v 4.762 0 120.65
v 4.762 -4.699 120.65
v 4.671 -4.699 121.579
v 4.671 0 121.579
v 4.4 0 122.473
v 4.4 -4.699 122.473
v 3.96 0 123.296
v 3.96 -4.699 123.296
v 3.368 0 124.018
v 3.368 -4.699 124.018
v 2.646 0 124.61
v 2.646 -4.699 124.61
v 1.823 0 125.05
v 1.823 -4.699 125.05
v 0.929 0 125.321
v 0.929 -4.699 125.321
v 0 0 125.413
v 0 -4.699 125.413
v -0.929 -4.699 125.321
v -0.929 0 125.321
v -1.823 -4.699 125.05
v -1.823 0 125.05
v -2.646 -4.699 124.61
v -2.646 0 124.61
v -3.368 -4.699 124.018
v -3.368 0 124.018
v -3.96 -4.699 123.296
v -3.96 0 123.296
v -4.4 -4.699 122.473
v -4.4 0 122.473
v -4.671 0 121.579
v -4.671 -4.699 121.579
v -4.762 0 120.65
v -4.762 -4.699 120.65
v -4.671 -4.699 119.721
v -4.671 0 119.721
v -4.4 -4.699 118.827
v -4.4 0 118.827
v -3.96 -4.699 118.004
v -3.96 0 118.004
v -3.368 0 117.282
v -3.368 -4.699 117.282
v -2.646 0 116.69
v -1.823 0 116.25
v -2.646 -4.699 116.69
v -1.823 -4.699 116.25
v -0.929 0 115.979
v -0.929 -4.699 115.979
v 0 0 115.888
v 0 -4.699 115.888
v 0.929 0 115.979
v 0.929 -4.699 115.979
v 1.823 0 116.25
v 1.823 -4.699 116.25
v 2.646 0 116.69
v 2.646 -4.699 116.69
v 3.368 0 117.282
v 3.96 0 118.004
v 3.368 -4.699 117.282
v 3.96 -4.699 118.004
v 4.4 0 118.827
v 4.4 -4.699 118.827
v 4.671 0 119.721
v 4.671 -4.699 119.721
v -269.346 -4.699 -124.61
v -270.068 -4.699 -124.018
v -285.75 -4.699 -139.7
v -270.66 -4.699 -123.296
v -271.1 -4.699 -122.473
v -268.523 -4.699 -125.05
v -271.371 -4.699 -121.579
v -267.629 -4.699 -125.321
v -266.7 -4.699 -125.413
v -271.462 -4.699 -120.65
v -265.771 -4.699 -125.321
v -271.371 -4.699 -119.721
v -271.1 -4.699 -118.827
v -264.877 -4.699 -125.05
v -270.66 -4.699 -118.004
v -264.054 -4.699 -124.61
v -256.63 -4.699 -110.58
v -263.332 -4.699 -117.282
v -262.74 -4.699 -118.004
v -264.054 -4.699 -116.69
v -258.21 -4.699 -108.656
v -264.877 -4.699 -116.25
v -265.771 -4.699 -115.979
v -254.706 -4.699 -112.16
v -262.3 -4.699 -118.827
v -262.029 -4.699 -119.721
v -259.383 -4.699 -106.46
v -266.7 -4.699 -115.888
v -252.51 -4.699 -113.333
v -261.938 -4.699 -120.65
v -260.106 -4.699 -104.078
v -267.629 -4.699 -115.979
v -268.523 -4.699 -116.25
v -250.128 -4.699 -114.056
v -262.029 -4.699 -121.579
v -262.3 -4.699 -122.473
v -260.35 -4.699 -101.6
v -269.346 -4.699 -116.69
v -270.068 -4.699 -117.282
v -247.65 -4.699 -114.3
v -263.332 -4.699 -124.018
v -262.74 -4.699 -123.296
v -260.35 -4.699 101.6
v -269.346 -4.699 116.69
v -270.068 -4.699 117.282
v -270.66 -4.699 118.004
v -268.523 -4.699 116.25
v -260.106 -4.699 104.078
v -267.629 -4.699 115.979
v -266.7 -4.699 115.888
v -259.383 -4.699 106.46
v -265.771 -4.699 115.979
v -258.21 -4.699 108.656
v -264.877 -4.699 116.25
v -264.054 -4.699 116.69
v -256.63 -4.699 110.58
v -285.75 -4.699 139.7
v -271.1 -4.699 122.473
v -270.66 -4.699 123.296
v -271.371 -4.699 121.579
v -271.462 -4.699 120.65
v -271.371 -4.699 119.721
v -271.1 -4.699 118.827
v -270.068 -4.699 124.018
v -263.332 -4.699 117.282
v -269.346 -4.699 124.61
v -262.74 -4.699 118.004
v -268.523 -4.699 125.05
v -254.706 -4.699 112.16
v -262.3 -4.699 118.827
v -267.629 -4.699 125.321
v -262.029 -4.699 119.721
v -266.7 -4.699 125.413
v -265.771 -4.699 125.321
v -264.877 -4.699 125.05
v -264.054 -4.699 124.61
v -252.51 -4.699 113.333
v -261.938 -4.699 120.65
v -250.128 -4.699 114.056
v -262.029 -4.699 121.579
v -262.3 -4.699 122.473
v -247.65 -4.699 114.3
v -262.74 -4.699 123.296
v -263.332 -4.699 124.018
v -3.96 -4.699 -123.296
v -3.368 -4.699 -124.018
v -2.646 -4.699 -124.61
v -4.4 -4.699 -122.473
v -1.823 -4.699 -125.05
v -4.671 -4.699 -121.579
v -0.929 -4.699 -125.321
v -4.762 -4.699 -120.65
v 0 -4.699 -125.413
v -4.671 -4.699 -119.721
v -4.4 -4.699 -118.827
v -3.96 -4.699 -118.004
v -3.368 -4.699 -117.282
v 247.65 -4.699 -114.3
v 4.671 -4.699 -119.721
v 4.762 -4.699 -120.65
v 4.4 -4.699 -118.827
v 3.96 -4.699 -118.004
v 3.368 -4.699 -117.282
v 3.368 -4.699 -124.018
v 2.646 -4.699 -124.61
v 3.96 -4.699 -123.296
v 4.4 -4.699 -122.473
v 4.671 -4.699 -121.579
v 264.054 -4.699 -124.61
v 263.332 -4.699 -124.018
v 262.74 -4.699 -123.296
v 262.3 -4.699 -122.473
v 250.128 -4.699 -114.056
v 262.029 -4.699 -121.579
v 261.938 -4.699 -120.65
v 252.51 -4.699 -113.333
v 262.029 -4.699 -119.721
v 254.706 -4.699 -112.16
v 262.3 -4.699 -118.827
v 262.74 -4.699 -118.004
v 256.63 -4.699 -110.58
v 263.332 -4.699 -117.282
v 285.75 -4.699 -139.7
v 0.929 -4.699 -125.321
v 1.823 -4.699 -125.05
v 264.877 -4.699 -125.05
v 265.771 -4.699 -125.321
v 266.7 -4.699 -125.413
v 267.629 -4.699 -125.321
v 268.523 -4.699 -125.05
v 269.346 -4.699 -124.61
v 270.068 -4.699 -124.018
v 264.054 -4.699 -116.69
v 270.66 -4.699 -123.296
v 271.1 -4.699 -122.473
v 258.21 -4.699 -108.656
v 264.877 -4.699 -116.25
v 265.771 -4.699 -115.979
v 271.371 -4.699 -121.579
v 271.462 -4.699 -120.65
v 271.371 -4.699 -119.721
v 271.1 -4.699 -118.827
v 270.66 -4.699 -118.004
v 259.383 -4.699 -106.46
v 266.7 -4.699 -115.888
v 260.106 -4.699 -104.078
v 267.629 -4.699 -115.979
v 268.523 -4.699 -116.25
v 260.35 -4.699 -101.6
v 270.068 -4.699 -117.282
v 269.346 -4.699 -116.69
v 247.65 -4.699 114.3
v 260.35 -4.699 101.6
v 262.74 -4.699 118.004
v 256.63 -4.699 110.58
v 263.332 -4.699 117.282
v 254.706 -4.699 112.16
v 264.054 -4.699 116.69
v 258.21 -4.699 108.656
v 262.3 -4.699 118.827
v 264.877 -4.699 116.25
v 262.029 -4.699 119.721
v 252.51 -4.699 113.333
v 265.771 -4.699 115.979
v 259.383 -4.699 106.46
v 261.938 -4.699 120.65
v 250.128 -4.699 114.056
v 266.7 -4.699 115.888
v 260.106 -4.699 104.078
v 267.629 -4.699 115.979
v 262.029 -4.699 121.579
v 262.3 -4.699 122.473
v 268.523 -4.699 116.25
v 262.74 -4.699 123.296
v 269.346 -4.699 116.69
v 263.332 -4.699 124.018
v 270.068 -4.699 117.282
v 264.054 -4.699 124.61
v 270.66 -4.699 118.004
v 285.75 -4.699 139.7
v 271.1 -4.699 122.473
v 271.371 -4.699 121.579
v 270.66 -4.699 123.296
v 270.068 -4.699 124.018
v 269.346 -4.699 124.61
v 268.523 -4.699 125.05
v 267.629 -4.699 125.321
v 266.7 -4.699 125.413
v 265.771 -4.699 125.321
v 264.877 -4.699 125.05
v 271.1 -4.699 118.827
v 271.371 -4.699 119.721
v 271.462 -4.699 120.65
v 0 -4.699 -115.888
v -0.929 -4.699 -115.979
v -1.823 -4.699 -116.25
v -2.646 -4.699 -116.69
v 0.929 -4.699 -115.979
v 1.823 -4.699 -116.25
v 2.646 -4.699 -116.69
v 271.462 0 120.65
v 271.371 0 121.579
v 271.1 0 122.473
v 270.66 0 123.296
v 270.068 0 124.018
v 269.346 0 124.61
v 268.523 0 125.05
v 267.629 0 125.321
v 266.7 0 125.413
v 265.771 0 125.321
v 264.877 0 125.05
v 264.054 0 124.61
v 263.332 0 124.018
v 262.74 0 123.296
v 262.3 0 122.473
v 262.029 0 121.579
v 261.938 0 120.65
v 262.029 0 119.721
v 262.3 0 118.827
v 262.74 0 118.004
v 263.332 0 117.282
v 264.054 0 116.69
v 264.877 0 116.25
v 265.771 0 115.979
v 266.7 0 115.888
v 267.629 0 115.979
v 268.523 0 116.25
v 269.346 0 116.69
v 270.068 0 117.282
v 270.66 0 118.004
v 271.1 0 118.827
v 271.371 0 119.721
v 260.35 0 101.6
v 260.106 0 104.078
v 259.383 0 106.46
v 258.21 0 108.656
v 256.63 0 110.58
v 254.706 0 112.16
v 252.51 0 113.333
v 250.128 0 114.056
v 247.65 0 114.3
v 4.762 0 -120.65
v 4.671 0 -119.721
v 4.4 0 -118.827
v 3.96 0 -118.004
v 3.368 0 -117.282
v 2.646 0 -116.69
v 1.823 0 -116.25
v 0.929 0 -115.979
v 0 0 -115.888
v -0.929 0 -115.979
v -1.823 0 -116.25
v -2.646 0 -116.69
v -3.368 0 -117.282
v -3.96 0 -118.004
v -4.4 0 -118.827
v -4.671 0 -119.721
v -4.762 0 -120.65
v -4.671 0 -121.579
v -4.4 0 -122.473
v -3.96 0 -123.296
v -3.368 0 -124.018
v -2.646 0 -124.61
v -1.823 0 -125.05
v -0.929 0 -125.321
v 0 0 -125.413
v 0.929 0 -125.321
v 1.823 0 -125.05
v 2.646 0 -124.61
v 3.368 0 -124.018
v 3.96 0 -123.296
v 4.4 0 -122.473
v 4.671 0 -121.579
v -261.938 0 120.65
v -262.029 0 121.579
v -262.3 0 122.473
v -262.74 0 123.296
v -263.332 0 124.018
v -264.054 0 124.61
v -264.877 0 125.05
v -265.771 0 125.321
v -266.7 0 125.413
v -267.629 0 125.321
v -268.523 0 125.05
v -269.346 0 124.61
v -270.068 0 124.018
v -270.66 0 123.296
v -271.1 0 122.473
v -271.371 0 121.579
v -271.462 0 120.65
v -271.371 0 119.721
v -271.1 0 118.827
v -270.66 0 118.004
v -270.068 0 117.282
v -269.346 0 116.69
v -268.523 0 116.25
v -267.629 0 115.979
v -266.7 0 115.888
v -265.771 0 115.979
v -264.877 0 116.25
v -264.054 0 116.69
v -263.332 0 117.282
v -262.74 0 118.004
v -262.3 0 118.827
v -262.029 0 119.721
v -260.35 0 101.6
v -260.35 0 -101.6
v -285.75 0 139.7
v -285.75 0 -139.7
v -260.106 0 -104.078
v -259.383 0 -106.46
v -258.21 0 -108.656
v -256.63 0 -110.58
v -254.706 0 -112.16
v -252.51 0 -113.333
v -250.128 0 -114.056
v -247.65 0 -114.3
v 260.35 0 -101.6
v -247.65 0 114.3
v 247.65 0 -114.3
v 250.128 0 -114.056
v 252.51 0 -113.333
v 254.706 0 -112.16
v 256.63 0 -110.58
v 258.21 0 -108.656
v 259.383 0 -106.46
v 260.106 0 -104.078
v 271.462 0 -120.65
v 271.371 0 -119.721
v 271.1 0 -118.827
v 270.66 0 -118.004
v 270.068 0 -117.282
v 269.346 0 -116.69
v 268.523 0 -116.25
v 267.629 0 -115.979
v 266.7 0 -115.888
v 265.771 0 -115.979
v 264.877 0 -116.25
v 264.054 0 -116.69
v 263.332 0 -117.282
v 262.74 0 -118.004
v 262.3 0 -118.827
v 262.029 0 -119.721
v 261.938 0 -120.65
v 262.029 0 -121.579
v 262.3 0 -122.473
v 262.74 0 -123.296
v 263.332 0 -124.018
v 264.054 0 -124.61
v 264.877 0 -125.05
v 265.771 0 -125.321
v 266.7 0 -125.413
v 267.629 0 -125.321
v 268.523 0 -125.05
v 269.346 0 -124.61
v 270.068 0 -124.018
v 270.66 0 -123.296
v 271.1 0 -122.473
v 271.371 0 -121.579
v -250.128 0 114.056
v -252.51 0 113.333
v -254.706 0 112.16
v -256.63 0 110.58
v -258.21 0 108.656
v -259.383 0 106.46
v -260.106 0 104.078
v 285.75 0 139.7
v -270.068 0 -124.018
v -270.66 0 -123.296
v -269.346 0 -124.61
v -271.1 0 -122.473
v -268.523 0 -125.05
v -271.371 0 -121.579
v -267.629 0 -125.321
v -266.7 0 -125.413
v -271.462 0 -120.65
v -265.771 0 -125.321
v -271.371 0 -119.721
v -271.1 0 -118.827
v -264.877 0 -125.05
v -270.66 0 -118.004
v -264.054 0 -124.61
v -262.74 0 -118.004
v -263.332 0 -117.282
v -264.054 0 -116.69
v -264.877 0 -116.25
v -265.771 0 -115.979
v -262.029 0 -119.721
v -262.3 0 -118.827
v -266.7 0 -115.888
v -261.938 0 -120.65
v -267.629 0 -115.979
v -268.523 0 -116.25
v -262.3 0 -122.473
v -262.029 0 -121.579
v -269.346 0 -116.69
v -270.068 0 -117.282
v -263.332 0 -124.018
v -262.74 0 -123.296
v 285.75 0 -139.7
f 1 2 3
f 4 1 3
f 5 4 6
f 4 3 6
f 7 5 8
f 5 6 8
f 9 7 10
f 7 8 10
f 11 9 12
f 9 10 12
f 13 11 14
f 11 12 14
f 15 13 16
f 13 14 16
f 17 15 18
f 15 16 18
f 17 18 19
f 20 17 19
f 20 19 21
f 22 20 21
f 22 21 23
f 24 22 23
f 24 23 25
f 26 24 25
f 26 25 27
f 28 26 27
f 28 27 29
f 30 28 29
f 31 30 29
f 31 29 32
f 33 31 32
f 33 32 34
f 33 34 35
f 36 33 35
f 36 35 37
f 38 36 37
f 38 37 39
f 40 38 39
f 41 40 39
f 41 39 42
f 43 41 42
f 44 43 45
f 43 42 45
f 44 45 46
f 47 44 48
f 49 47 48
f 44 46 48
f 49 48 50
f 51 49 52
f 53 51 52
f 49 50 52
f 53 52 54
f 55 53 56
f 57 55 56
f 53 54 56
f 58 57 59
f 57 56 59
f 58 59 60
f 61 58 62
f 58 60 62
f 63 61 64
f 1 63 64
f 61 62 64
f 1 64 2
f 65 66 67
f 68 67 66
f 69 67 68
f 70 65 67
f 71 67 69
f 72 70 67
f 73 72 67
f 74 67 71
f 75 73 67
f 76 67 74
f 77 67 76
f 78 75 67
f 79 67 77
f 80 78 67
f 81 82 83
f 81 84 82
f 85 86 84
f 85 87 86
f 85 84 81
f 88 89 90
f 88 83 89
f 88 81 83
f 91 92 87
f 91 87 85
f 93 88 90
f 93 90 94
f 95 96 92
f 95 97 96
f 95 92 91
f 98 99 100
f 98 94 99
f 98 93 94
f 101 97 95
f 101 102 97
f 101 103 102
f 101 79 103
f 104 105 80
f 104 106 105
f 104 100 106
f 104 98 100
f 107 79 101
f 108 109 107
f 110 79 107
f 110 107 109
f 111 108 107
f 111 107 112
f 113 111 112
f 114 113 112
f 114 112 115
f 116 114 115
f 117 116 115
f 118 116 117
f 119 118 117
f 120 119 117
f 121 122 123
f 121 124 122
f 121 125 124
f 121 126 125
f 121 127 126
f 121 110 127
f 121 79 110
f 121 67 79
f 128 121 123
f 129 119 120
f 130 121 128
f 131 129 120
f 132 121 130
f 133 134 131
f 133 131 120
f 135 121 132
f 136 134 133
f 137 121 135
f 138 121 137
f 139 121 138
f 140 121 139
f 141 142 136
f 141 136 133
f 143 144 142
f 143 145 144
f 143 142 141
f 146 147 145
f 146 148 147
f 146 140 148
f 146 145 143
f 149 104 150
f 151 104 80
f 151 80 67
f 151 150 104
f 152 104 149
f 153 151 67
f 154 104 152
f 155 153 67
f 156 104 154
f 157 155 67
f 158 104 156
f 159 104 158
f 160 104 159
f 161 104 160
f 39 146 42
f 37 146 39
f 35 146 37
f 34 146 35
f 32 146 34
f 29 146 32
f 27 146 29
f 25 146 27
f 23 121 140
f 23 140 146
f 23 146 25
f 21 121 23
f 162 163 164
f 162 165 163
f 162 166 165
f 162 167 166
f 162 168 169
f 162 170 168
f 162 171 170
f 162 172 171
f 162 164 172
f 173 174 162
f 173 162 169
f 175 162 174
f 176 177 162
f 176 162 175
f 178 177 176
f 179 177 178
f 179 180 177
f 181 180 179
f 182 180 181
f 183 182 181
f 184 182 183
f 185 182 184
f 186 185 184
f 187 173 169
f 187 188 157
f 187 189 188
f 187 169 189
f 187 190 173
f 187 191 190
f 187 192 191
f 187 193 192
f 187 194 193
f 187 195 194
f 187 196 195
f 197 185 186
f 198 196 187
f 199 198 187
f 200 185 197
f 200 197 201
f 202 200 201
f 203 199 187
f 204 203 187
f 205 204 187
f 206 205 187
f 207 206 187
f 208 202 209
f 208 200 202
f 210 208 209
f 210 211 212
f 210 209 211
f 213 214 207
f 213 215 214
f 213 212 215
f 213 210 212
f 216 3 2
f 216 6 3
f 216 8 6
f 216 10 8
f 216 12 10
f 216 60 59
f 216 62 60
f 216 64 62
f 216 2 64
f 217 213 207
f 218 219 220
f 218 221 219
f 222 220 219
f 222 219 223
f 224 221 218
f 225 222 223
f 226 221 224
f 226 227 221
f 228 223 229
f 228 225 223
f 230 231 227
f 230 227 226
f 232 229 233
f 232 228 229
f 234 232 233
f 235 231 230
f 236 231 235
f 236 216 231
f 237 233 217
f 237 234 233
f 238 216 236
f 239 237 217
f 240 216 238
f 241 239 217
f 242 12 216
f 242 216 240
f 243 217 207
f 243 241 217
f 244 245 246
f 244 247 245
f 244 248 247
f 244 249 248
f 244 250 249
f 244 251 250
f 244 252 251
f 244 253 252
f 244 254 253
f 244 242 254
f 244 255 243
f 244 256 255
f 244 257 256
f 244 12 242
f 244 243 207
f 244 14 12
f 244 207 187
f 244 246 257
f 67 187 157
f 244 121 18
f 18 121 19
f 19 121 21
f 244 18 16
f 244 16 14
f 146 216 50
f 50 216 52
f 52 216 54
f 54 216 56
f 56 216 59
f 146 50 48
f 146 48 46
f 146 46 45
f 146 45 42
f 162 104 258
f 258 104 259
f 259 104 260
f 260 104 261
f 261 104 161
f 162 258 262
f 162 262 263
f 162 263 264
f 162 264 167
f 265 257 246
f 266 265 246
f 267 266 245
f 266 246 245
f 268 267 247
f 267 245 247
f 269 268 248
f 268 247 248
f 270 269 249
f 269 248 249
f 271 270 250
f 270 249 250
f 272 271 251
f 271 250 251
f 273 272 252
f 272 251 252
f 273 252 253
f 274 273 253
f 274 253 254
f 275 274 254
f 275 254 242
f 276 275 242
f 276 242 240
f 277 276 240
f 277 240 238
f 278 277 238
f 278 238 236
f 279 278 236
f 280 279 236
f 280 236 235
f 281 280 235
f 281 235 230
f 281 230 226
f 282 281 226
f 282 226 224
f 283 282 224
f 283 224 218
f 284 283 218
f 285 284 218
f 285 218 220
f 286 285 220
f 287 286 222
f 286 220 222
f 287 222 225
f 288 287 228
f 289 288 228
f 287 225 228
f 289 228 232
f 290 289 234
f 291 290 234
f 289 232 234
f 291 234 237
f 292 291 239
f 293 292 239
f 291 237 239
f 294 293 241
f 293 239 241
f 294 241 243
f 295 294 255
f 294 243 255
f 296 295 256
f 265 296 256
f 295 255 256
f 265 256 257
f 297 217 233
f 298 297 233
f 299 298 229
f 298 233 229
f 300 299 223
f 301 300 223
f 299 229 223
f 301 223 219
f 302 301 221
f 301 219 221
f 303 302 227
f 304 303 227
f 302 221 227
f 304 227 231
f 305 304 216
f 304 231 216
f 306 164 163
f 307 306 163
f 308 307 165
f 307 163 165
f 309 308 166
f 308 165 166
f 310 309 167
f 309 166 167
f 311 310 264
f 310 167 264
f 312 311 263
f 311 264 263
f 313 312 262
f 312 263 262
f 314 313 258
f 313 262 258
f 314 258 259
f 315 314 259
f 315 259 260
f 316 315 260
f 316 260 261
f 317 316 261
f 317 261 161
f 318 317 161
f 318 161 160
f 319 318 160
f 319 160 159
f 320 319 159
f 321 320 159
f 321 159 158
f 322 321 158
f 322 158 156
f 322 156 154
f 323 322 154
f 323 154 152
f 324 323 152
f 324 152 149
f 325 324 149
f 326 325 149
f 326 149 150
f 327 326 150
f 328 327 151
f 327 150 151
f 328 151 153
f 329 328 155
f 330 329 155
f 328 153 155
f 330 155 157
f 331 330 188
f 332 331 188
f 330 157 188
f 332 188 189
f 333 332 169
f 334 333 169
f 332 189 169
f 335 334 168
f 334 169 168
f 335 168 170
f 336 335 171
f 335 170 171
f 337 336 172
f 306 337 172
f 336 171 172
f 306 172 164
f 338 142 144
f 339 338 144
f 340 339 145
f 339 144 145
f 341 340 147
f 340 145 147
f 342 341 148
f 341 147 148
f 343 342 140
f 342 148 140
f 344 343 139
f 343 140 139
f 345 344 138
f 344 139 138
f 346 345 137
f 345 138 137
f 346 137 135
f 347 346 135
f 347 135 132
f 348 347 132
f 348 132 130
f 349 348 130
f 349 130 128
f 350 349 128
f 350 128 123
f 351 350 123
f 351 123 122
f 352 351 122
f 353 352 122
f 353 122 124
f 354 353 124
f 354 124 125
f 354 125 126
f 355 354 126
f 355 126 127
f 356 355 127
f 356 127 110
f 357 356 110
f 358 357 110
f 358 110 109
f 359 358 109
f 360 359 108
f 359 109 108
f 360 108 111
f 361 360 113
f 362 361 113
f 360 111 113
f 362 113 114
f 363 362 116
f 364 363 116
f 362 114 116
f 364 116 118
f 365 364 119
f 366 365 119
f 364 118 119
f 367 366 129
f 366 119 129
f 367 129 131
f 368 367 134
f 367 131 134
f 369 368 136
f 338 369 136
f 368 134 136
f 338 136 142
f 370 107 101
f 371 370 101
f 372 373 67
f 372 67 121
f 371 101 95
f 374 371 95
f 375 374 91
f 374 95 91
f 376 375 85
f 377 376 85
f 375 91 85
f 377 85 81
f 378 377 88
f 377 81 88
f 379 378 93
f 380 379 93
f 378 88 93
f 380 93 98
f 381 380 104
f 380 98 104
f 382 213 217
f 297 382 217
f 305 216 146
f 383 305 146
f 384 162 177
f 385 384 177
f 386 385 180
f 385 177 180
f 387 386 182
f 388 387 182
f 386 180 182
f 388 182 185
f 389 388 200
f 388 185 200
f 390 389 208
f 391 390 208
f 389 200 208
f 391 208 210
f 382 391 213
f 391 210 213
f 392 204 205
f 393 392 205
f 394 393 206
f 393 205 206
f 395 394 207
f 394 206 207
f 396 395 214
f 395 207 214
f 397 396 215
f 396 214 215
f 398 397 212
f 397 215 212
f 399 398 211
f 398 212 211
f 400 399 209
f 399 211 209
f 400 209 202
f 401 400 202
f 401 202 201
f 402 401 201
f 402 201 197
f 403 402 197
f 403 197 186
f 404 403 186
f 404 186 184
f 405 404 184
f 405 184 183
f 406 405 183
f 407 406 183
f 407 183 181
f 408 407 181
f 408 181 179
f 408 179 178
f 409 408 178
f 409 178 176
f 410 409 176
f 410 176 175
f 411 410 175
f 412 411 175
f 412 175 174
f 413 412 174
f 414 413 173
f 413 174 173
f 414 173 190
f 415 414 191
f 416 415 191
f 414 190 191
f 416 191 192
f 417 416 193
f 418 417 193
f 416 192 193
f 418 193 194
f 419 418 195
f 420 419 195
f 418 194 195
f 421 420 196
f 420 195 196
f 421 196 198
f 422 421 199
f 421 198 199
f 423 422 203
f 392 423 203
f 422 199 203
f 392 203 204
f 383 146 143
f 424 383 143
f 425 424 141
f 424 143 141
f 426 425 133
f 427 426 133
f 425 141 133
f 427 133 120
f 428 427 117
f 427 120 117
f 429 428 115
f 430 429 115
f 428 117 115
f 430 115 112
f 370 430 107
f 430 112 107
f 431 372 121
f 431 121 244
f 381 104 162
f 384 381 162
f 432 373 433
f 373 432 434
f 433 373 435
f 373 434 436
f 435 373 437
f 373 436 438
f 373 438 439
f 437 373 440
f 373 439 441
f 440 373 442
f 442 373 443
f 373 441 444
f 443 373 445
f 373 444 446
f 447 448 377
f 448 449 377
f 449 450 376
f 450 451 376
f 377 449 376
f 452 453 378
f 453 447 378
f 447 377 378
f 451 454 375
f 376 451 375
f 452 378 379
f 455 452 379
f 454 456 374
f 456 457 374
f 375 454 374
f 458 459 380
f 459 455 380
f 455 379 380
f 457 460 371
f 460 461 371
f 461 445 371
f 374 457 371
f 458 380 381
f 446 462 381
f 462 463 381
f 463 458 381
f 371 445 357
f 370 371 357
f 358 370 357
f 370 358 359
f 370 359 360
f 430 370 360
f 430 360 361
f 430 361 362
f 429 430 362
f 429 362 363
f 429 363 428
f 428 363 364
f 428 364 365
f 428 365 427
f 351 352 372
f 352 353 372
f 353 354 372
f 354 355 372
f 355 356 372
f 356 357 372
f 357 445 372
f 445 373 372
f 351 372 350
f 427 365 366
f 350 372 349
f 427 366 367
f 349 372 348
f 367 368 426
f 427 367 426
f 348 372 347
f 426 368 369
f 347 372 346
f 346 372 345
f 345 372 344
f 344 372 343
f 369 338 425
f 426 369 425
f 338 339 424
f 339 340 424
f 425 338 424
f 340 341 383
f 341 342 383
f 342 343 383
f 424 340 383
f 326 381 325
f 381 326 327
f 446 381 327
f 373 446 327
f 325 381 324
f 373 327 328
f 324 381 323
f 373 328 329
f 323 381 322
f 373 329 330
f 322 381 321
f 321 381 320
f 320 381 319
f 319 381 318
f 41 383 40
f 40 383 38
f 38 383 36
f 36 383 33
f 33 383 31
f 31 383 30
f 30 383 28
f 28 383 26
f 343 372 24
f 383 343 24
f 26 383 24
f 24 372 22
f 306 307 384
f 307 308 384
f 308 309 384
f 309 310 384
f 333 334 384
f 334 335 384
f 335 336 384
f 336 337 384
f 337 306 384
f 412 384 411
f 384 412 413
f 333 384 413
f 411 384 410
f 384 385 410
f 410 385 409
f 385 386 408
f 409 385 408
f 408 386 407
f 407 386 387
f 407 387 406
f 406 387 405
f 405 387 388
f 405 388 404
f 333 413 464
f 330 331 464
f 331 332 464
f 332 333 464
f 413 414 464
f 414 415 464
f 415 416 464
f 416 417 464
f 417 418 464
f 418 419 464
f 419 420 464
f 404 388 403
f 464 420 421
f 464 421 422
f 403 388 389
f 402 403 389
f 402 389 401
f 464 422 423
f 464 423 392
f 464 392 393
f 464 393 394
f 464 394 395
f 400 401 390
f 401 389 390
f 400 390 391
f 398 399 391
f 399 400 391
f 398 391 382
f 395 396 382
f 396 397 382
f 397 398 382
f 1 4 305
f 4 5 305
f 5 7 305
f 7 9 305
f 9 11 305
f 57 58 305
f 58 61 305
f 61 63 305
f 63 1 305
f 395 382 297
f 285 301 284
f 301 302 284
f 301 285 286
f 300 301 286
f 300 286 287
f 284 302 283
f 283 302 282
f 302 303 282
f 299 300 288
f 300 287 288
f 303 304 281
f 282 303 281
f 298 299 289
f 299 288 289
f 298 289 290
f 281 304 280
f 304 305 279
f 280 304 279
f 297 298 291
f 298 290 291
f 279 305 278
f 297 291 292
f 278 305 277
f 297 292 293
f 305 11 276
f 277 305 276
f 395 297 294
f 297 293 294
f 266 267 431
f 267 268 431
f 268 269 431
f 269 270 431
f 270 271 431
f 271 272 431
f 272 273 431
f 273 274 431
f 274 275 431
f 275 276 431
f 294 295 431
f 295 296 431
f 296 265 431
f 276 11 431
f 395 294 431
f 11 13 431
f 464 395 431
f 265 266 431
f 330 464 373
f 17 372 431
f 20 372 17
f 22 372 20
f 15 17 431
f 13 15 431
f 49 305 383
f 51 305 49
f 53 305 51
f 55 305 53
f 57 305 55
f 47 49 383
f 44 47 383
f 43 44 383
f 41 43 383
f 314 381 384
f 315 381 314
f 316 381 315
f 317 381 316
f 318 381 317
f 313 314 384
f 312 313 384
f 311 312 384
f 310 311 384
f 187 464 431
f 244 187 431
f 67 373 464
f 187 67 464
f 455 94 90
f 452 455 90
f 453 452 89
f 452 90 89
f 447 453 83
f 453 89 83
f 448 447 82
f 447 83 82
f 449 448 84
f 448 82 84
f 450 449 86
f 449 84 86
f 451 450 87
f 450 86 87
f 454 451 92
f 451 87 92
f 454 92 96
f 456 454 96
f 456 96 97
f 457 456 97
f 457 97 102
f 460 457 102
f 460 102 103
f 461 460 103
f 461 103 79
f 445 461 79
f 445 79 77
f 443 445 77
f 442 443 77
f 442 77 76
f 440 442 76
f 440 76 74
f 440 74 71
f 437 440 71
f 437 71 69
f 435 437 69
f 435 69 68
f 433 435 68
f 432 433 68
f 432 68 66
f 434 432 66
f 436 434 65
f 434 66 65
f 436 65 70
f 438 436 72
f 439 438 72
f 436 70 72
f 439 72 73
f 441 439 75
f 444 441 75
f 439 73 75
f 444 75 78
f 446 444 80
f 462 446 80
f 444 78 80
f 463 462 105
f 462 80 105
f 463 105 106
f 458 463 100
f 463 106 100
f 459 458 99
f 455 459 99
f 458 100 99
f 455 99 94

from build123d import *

# Parameters (mm, degrees)
F0_W     = 571.5
F0_H     = 279.4
F1_DEPTH = 4.699
F3_DEPTH = 4.7
F4_R     = 4.7625
F5_DEPTH = 4.7


with BuildPart() as f1:
    # F0 (on Front) → F1 (new body)
    with BuildSketch(Plane.XZ):
        Rectangle(F0_W, F0_H)
    extrude(amount=F1_DEPTH)

    # F2 (on face) → F3 (cut, through all)
    with BuildSketch(Plane.XZ.offset(4.699)):
        with BuildLine():
            Line((247.65, 114.3), (-247.65, 114.3))
            ThreePointArc((-247.65, 114.3), (-256.630256, 110.580256), (-260.35, 101.6))
            Line((-260.35, 101.6), (-260.35, -101.6))
            ThreePointArc((-260.35, -101.6), (-256.630256, -110.580256), (-247.65, -114.3))
            Line((-247.65, -114.3), (247.65, -114.3))
            ThreePointArc((247.65, -114.3), (256.630256, -110.580256), (260.35, -101.6))
            Line((260.35, -101.6), (260.35, 101.6))
            ThreePointArc((260.35, 101.6), (256.630256, 110.580256), (247.65, 114.3))
        make_face()
    extrude(amount=-F3_DEPTH, mode=Mode.SUBTRACT)

    # F4 (on face) → F5 (cut, through all)
    with BuildSketch(Plane.XZ.offset(4.699)):
        with Locations((-266.7, -120.65)):
            Circle(F4_R)
        with Locations((0, -120.65)):
            Circle(F4_R)
        with Locations((266.7, -120.65)):
            Circle(F4_R)
        with Locations((266.7, 120.65)):
            Circle(F4_R)
        with Locations((0, 120.65)):
            Circle(F4_R)
        with Locations((-266.7, 120.65)):
            Circle(F4_R)
    extrude(amount=-F5_DEPTH, mode=Mode.SUBTRACT)


solid = f1.part
